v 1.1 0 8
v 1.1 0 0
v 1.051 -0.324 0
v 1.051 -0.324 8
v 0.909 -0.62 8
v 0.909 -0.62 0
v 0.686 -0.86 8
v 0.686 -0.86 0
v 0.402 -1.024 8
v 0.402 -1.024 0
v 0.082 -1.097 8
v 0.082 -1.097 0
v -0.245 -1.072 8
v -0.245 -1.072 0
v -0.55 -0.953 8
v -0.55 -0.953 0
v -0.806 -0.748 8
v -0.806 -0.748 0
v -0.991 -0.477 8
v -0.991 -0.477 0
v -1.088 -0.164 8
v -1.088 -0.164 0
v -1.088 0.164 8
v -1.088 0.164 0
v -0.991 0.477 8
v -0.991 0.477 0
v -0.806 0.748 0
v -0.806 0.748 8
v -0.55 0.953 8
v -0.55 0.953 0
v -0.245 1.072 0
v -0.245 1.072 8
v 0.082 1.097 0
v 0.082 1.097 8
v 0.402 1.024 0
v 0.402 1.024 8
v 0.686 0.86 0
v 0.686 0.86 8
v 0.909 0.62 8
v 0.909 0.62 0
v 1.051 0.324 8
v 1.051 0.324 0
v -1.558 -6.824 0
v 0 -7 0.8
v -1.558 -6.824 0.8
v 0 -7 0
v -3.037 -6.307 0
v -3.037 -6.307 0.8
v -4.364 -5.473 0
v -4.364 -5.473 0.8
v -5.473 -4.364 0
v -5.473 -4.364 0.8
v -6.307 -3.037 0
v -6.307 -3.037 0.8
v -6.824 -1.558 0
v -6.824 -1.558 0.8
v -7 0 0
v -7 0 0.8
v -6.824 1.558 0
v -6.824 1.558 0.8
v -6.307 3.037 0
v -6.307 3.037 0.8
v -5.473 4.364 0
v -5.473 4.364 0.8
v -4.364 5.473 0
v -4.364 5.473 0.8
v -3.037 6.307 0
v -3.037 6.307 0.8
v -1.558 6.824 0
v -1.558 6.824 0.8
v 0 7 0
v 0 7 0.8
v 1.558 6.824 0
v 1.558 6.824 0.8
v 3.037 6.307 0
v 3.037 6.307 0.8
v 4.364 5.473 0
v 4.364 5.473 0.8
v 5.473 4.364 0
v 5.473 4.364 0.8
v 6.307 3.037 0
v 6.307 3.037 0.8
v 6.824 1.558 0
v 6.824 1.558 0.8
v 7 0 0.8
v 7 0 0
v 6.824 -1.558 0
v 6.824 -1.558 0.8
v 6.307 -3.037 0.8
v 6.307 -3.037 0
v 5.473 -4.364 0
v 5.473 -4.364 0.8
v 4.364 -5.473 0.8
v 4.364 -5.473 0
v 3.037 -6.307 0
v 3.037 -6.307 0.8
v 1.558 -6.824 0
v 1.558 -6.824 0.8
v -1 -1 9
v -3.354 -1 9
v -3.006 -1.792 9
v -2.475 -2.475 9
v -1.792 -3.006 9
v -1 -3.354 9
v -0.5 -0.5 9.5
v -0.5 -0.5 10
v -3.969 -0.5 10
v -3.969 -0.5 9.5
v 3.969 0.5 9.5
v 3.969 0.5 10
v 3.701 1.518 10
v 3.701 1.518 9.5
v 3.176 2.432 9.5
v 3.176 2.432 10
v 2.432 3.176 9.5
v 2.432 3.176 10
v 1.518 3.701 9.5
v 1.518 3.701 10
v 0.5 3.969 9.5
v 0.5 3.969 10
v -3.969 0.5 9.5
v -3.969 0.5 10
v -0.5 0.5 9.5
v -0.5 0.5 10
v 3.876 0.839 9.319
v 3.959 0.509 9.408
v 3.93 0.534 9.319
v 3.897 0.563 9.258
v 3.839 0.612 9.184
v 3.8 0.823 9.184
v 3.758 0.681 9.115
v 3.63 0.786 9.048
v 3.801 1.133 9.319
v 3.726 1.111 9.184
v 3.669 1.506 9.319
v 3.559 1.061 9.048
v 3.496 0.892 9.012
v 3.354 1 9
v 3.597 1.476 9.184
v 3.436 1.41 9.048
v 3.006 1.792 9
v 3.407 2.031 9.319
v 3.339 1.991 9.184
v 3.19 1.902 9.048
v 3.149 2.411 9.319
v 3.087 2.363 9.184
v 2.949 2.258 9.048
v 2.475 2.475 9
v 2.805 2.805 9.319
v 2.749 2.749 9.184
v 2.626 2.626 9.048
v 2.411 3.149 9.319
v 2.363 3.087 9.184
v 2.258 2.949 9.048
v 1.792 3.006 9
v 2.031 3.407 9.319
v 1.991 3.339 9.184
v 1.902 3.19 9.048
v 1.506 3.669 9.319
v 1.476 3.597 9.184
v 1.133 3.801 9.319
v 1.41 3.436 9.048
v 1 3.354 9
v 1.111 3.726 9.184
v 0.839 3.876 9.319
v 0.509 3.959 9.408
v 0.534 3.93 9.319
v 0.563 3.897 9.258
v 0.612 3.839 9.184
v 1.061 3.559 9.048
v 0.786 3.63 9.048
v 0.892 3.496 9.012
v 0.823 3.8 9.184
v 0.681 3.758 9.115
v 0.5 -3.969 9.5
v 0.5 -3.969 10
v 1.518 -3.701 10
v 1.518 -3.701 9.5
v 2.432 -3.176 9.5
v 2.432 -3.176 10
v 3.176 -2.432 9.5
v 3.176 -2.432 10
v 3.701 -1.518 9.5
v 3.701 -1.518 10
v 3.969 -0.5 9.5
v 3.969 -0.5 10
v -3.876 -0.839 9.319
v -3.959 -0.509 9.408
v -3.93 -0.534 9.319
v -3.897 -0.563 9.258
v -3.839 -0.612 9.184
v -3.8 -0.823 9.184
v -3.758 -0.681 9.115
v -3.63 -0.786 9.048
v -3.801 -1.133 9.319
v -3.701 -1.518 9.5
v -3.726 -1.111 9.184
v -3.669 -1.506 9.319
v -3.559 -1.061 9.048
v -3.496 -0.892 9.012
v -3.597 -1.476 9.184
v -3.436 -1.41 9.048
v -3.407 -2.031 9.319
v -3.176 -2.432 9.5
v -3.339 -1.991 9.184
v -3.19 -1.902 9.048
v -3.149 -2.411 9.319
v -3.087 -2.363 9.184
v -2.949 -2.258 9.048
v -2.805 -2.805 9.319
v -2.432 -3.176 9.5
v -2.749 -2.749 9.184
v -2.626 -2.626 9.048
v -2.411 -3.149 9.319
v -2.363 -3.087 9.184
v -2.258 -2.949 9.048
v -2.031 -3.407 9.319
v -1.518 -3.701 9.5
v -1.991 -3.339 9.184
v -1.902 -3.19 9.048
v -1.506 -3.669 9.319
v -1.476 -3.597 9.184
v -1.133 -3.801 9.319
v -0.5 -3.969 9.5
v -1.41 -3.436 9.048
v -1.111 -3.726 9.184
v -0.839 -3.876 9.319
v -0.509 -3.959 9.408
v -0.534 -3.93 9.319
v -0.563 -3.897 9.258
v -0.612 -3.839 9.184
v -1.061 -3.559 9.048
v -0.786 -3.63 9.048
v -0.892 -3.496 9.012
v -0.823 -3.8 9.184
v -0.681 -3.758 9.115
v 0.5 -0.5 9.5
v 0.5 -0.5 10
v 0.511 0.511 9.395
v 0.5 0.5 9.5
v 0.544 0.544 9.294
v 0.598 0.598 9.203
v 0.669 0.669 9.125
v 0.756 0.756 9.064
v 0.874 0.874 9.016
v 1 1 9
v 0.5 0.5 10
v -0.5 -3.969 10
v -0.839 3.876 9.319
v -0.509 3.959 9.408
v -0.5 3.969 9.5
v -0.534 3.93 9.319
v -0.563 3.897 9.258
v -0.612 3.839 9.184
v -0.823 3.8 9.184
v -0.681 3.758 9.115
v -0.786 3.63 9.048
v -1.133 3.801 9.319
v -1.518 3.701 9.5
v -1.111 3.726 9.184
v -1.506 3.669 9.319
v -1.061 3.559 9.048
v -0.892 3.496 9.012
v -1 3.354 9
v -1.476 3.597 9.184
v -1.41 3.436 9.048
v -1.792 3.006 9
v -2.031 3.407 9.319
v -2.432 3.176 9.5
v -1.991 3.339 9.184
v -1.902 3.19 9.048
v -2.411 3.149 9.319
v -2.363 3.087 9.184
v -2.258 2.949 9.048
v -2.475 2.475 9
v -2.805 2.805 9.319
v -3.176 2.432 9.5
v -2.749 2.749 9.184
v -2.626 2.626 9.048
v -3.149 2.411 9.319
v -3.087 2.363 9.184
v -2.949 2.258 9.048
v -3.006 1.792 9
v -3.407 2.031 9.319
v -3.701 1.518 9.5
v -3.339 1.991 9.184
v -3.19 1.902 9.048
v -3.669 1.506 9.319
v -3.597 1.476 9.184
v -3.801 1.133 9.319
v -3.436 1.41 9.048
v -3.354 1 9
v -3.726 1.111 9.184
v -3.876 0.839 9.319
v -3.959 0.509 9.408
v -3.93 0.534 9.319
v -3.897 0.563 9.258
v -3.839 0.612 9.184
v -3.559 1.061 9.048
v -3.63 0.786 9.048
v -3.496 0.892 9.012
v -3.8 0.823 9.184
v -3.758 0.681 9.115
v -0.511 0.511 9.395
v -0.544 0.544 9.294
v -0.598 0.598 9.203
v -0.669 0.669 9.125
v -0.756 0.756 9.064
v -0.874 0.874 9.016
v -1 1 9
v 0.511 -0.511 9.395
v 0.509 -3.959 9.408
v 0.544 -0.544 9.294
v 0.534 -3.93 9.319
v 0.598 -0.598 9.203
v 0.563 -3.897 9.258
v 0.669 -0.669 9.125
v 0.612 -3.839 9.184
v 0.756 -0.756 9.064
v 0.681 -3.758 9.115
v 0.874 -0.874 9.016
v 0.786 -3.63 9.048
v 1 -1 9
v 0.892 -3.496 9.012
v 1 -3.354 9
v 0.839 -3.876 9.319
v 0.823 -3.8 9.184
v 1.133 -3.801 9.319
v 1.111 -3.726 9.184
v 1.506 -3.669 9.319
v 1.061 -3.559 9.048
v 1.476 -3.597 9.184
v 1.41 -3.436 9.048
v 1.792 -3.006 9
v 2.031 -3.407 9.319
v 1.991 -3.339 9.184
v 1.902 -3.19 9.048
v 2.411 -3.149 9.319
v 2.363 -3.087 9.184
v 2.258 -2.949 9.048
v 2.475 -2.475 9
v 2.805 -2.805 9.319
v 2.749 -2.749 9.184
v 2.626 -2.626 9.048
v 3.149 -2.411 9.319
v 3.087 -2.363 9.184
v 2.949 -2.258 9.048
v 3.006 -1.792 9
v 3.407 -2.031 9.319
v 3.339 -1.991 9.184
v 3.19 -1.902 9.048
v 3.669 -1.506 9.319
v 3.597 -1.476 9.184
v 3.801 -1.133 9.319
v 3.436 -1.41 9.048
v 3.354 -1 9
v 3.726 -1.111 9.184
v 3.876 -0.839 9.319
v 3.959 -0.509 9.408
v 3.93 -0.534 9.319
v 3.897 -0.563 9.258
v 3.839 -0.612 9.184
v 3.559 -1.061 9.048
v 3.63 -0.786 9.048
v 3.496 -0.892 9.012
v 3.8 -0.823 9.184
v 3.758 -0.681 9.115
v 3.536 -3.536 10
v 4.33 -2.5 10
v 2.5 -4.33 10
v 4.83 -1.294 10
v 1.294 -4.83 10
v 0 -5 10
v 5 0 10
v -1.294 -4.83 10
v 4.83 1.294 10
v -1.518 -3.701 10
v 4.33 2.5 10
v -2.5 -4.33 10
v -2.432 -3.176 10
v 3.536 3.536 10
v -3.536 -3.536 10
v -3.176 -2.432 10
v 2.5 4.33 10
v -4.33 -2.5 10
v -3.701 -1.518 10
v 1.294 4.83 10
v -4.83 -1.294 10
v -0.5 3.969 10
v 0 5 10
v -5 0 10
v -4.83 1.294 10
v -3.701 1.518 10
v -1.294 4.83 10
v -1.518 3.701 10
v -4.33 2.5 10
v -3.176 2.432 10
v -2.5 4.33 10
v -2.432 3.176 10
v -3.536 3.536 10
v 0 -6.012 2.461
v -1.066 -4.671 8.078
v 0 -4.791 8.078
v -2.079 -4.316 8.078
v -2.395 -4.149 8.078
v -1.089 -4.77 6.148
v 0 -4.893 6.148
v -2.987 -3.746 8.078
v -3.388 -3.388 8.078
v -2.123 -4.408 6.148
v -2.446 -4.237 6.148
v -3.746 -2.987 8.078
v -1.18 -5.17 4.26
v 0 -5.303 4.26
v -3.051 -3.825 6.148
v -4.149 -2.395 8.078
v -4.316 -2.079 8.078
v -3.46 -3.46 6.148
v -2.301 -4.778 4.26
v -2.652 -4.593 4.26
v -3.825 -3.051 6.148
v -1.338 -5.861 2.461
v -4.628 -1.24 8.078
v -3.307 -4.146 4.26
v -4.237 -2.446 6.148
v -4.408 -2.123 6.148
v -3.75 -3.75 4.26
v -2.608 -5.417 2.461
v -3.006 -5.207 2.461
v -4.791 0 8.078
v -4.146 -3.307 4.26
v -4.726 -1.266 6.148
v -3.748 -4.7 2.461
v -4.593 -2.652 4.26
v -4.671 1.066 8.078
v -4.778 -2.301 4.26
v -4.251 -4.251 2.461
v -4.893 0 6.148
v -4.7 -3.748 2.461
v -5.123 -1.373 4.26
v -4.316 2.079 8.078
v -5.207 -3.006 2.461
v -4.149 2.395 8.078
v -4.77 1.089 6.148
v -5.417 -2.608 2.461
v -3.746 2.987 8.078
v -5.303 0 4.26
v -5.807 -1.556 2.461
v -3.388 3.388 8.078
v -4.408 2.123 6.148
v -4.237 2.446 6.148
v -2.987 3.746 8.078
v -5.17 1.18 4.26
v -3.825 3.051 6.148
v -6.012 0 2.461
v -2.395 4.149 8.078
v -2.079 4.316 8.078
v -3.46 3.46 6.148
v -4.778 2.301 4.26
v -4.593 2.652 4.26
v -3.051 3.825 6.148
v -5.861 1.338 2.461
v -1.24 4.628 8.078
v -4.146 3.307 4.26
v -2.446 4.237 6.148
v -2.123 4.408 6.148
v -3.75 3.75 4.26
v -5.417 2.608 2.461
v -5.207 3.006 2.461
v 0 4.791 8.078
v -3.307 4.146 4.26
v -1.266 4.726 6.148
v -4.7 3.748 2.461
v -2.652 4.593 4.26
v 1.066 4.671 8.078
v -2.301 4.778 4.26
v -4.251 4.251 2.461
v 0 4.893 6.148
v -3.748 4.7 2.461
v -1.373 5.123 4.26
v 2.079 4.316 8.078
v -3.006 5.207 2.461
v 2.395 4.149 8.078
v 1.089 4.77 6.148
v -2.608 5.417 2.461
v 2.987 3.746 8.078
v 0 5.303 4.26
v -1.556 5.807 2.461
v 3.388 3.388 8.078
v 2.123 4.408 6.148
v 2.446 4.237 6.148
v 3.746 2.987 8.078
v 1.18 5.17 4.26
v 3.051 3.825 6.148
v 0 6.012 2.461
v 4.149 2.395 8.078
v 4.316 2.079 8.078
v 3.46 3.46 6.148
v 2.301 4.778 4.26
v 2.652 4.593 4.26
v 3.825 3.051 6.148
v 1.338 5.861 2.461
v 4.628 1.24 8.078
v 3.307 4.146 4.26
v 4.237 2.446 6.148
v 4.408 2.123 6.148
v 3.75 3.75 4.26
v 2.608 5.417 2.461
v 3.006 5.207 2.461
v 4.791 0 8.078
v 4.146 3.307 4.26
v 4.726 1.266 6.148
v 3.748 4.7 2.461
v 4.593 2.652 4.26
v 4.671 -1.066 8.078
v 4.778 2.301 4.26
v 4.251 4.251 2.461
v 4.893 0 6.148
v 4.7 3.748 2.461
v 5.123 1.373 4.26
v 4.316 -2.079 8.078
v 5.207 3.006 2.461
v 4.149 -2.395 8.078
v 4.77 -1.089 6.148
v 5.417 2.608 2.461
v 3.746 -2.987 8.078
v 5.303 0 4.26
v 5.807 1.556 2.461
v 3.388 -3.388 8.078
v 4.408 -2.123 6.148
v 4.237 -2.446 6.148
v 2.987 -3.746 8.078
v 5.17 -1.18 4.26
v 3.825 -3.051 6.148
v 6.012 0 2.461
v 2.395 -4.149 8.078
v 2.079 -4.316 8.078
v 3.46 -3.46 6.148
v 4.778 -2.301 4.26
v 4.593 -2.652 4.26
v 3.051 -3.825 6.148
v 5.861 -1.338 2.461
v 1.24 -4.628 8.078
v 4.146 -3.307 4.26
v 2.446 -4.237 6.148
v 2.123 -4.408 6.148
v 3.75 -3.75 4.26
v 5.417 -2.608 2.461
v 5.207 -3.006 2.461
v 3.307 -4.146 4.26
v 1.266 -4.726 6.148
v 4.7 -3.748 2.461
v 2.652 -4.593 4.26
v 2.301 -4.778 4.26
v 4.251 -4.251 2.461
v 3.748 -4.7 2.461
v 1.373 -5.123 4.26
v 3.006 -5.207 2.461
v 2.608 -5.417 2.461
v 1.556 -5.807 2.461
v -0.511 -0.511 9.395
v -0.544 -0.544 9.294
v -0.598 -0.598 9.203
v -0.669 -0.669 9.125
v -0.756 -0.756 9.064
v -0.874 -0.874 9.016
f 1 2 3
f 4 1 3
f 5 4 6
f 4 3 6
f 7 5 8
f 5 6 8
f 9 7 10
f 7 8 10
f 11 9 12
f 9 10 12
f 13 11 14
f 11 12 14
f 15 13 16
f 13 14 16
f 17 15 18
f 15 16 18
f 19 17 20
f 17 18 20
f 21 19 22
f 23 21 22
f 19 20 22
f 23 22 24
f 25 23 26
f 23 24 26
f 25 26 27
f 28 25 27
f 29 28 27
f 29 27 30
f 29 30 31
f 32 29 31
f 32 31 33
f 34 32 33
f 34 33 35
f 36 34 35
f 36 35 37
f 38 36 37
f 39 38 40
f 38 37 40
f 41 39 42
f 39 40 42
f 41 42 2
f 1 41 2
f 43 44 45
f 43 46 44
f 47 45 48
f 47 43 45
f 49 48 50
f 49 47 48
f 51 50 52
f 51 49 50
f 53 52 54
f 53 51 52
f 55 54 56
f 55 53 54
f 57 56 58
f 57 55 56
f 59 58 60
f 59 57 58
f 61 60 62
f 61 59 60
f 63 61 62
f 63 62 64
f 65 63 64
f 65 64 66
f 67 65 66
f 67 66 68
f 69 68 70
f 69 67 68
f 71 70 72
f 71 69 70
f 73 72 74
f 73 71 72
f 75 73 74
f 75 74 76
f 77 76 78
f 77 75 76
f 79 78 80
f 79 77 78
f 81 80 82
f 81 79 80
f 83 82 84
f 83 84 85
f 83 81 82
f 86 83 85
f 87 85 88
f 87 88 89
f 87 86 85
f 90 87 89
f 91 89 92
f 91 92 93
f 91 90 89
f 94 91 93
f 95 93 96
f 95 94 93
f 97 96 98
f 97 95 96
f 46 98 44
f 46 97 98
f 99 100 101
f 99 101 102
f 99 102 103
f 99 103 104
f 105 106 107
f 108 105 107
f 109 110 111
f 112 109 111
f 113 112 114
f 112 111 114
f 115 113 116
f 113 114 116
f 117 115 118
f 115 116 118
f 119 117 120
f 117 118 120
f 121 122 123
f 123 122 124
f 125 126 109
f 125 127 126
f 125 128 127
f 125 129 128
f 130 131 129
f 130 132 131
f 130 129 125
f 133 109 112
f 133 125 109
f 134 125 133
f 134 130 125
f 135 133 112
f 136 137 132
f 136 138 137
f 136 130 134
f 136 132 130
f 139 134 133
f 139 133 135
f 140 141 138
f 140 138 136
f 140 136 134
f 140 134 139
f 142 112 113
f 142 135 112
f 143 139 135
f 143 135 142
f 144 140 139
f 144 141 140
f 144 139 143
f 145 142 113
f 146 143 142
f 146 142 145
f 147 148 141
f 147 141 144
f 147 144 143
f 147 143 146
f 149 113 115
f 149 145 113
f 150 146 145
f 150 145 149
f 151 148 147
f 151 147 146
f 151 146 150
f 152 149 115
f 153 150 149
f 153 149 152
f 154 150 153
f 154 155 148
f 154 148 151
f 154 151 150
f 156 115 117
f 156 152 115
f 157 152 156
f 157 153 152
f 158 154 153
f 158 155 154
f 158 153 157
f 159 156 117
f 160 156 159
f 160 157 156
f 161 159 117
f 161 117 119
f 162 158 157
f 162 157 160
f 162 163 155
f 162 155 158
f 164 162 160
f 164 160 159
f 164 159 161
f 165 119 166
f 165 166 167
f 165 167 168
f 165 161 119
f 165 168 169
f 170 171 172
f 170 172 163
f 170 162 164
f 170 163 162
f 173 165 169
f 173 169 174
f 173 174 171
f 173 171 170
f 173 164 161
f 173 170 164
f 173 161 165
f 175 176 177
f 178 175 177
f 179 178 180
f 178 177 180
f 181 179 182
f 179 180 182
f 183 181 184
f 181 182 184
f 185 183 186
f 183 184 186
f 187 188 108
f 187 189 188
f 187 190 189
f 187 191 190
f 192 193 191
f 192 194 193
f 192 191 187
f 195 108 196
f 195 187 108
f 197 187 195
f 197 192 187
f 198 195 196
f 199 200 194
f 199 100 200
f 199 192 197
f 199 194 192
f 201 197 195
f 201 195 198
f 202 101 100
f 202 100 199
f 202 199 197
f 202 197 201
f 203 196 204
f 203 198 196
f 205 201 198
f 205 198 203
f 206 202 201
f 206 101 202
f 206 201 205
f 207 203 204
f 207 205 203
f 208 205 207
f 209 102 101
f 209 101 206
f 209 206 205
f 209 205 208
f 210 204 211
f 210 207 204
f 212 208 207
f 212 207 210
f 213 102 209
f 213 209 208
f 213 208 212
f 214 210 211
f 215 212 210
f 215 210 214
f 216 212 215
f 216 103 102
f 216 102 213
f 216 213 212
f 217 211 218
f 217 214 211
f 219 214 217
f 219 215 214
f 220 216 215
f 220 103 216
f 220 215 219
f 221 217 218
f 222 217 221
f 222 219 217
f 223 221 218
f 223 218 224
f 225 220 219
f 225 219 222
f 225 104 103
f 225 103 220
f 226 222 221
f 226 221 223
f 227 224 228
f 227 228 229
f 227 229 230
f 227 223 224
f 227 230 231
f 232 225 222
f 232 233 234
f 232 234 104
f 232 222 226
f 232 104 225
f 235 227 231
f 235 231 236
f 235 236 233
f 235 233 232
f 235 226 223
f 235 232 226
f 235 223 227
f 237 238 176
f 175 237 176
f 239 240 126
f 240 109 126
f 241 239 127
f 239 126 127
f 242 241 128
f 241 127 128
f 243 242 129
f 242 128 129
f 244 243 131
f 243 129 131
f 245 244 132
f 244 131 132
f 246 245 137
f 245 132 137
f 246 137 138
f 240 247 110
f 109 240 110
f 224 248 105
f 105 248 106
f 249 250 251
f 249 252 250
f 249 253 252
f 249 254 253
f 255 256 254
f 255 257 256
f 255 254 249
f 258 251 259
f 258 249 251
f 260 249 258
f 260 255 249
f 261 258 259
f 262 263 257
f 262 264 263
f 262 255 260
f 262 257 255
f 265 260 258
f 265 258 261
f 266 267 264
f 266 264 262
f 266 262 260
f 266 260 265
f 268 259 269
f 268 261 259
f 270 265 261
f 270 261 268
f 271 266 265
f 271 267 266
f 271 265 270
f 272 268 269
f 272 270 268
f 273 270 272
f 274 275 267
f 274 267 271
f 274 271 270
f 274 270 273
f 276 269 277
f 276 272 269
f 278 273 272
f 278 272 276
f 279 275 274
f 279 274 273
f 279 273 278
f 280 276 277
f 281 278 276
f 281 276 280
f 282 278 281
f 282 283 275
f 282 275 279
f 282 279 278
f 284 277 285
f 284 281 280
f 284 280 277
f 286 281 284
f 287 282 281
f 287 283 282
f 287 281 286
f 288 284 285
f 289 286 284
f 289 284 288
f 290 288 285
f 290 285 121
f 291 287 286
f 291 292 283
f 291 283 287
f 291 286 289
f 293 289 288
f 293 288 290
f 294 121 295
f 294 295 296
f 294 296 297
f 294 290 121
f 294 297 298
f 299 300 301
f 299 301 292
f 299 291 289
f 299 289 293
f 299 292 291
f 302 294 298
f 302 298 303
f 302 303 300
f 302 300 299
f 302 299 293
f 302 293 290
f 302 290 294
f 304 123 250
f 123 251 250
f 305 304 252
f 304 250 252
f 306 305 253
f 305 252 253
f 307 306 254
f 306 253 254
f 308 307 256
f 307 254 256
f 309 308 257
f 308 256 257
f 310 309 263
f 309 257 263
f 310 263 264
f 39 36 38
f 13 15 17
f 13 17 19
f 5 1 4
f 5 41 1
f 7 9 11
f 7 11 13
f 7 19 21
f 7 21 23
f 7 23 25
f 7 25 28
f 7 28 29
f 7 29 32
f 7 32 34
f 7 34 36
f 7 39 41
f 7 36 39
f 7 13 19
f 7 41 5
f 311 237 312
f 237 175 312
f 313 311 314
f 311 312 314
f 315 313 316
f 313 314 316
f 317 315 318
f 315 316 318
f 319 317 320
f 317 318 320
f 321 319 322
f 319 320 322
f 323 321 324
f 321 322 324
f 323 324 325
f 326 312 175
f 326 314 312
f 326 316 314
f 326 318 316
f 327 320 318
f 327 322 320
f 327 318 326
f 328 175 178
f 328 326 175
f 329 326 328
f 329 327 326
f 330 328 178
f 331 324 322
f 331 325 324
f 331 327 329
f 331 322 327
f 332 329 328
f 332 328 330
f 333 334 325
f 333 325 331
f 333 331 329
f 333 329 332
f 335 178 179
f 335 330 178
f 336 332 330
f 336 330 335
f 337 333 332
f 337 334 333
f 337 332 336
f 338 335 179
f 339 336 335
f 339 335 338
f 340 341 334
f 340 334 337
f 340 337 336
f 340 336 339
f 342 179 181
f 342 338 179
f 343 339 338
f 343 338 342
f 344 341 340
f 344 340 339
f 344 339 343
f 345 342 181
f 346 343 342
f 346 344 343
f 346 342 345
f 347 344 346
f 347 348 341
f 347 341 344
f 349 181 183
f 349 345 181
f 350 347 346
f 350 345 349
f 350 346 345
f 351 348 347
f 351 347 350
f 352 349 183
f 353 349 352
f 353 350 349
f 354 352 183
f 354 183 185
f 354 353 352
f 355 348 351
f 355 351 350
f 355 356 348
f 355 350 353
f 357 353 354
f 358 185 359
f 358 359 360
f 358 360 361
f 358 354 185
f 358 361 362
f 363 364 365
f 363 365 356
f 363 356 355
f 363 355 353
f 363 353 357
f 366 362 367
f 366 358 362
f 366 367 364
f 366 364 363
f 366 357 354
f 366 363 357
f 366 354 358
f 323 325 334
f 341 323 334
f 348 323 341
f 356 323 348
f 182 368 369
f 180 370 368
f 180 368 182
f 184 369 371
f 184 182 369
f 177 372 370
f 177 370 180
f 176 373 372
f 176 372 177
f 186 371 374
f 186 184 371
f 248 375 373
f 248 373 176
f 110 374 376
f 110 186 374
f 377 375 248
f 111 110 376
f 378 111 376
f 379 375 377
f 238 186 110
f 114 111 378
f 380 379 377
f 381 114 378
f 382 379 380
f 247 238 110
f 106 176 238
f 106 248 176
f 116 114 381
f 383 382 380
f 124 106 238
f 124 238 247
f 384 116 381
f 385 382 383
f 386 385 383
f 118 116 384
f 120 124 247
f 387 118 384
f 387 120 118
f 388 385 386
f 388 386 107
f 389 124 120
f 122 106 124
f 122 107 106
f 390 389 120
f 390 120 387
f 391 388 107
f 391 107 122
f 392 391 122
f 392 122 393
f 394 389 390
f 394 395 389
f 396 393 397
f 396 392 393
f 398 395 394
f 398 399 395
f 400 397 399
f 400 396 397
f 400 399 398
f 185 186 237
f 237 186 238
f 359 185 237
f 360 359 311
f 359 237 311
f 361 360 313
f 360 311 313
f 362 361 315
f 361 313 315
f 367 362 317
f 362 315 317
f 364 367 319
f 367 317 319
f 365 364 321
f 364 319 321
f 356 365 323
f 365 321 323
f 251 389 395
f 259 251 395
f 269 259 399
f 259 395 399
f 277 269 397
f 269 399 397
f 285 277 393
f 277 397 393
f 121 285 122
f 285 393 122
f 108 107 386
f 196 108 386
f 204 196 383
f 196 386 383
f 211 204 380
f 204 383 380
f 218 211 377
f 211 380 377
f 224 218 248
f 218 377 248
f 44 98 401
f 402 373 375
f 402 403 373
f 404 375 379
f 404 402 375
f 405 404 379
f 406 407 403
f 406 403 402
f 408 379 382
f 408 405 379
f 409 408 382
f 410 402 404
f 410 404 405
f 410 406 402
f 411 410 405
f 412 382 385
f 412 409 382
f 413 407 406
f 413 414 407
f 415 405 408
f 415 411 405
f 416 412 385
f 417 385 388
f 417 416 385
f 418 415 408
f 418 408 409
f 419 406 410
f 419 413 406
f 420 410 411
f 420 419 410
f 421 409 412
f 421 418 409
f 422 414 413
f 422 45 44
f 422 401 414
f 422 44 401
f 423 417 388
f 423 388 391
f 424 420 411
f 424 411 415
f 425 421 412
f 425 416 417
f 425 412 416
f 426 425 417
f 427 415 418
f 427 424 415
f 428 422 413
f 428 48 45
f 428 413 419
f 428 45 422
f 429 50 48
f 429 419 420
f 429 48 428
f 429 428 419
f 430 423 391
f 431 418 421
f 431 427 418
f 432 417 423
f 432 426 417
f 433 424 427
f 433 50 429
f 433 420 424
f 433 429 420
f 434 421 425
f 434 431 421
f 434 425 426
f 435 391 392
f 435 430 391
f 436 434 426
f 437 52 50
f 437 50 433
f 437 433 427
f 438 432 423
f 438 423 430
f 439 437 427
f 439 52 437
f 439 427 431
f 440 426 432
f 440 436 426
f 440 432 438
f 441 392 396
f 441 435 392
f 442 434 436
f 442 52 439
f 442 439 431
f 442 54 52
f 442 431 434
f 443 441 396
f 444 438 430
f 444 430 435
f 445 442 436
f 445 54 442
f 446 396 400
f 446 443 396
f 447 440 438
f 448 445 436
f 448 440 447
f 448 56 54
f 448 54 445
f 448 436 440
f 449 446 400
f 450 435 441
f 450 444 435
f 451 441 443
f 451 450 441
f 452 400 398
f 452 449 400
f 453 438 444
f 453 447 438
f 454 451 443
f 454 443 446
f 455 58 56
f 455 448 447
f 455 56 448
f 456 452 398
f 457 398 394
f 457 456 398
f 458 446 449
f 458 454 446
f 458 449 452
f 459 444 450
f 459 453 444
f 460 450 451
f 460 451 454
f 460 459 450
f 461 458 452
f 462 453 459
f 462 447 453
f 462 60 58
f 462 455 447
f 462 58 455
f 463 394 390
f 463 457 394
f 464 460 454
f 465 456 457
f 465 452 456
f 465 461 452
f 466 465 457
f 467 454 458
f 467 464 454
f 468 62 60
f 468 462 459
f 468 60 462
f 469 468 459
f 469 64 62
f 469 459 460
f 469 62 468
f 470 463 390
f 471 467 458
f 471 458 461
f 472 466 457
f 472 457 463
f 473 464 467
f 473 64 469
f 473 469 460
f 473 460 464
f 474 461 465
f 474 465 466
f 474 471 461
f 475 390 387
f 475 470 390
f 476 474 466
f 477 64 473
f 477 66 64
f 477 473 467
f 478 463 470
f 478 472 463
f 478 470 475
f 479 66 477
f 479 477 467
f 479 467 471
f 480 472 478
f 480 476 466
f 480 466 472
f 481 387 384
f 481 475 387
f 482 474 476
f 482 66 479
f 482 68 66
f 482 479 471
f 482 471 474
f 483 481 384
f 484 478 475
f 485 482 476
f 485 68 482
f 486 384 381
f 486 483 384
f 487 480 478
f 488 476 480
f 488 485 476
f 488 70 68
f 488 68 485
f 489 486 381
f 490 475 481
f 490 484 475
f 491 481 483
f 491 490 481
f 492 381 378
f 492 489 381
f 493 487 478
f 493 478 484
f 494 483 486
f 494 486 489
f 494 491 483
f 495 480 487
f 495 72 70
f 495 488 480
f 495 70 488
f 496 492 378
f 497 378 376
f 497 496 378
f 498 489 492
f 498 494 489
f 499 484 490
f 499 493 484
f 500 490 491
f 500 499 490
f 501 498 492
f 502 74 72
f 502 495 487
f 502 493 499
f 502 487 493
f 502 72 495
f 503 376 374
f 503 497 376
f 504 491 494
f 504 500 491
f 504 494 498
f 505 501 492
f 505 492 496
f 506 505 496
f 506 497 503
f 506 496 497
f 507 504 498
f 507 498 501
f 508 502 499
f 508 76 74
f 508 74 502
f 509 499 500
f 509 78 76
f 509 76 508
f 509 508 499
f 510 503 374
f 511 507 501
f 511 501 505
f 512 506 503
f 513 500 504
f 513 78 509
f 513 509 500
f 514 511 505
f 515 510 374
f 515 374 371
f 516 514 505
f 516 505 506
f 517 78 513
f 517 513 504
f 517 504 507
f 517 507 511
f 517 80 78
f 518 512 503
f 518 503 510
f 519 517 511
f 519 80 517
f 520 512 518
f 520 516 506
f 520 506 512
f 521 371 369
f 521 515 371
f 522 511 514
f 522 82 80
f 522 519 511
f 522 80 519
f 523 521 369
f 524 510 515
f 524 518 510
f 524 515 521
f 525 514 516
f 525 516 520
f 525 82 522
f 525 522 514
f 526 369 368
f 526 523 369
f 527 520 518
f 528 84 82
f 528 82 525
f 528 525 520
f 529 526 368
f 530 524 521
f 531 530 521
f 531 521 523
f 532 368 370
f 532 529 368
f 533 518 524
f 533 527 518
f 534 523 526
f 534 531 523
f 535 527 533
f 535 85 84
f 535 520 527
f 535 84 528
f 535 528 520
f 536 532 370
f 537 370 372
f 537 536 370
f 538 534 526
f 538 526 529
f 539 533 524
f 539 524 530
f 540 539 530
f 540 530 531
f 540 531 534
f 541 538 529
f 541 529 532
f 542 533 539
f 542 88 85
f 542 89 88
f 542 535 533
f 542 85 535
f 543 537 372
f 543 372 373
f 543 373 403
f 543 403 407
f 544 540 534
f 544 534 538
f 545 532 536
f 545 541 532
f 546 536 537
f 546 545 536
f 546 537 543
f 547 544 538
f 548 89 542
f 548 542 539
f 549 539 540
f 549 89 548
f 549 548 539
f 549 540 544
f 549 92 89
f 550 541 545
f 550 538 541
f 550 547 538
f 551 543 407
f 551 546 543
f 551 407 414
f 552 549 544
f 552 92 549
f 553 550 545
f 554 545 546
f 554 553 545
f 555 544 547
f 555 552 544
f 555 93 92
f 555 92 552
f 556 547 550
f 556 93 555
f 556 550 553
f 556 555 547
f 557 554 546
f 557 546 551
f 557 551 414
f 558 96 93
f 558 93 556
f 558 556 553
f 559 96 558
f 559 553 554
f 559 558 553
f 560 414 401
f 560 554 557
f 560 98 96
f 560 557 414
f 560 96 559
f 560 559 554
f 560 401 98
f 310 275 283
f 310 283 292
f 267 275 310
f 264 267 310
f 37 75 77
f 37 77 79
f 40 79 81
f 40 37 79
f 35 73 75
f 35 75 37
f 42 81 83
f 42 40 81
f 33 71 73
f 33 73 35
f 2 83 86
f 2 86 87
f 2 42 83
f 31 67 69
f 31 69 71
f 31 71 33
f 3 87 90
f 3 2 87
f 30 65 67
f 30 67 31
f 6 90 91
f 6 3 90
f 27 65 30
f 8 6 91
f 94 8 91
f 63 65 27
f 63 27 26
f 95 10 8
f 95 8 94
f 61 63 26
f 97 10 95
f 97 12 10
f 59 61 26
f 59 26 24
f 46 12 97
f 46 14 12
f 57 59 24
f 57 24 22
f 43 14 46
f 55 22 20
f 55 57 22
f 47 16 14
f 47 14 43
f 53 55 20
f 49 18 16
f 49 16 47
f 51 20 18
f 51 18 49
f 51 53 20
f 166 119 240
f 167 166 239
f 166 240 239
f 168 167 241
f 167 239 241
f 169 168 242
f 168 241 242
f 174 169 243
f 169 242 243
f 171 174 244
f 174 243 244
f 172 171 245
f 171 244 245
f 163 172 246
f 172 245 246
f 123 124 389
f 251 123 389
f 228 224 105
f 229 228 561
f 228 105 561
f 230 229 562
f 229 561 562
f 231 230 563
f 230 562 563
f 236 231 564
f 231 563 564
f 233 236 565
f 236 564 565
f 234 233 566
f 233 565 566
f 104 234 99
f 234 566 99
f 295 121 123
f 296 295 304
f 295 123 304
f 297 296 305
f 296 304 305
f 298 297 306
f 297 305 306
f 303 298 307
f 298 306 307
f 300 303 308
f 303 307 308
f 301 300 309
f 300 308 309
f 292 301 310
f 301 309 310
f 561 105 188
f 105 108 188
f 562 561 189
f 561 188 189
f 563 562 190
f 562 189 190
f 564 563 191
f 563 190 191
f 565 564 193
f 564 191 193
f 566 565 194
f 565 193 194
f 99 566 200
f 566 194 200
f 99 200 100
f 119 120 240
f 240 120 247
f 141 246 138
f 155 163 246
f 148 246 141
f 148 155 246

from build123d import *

# Parameters (mm, degrees)
F2_R     = 1.1
F3_DEPTH = 8
F5_DEPTH = 1
F6_R     = 0.5


with BuildPart() as f1:
    # F0 (on Right) → F1 (revolve)
    with BuildSketch(Plane.YZ):
        with BuildLine():
            Line((-7, 0), (0, 0))
            Line((0, 0), (0, 10))
            Line((0, 10), (-5, 10))
            ThreePointArc((-5, 10), (-5.060069, 5.195667), (-7, 0.8))
            Line((-7, 0.8), (-7, 0))
        make_face()
    revolve(axis=Axis((0, 0, 7.262046), (0, 0, -1)))

    # F2 (on face) → F3 (cut)
    with BuildSketch(Plane(origin=(0, 0, 0), x_dir=(1, 0, 0), z_dir=(0, 0, -1))):
        Circle(F2_R)
    extrude(amount=-F3_DEPTH, mode=Mode.SUBTRACT)

    # F4 (on face) → F5 (cut)
    with BuildSketch(Plane.XY.offset(10)):
        with BuildLine():
            Line((-0.5, 0.5), (-0.5, 3.968627))
            ThreePointArc((-0.5, 3.968627), (-2.828427, 2.828427), (-3.968627, 0.5))
            Line((-3.968627, 0.5), (-0.5, 0.5))
        make_face()
        with BuildLine():
            ThreePointArc((3.968627, 0.5), (2.828427, 2.828427), (0.5, 3.968627))
            Line((0.5, 3.968627), (0.5, 0.5))
            Line((0.5, 0.5), (3.968627, 0.5))
        make_face()
        with BuildLine():
            Line((-0.5, -0.5), (-3.968627, -0.5))
            ThreePointArc((-3.968627, -0.5), (-2.828427, -2.828427), (-0.5, -3.968627))
            Line((-0.5, -3.968627), (-0.5, -0.5))
        make_face()
        with BuildLine():
            Line((0.5, -0.5), (0.5, -3.968627))
            ThreePointArc((0.5, -3.968627), (2.828427, -2.828427), (3.968627, -0.5))
            Line((3.968627, -0.5), (0.5, -0.5))
        make_face()
    extrude(amount=-F5_DEPTH, mode=Mode.SUBTRACT)

    # F6
    f6_edges = [f1.edges().sort_by_distance(p)[0] for p in [
        (-2.234313, 0.5, 9),
        (-0.5, 2.234313, 9),
        (-2.828427, 2.828427, 9),
        (2.828427, 2.828427, 9),
        (0.5, 2.234313, 9),
        (2.234313, 0.5, 9),
        (2.234313, -0.5, 9),
        (0.5, -2.234313, 9),
        (2.828427, -2.828427, 9),
        (-0.5, -2.234313, 9),
        (-2.234313, -0.5, 9),
        (-2.828427, -2.828427, 9),
    ]]
    fillet(f6_edges, radius=F6_R)


solid = f1.part
